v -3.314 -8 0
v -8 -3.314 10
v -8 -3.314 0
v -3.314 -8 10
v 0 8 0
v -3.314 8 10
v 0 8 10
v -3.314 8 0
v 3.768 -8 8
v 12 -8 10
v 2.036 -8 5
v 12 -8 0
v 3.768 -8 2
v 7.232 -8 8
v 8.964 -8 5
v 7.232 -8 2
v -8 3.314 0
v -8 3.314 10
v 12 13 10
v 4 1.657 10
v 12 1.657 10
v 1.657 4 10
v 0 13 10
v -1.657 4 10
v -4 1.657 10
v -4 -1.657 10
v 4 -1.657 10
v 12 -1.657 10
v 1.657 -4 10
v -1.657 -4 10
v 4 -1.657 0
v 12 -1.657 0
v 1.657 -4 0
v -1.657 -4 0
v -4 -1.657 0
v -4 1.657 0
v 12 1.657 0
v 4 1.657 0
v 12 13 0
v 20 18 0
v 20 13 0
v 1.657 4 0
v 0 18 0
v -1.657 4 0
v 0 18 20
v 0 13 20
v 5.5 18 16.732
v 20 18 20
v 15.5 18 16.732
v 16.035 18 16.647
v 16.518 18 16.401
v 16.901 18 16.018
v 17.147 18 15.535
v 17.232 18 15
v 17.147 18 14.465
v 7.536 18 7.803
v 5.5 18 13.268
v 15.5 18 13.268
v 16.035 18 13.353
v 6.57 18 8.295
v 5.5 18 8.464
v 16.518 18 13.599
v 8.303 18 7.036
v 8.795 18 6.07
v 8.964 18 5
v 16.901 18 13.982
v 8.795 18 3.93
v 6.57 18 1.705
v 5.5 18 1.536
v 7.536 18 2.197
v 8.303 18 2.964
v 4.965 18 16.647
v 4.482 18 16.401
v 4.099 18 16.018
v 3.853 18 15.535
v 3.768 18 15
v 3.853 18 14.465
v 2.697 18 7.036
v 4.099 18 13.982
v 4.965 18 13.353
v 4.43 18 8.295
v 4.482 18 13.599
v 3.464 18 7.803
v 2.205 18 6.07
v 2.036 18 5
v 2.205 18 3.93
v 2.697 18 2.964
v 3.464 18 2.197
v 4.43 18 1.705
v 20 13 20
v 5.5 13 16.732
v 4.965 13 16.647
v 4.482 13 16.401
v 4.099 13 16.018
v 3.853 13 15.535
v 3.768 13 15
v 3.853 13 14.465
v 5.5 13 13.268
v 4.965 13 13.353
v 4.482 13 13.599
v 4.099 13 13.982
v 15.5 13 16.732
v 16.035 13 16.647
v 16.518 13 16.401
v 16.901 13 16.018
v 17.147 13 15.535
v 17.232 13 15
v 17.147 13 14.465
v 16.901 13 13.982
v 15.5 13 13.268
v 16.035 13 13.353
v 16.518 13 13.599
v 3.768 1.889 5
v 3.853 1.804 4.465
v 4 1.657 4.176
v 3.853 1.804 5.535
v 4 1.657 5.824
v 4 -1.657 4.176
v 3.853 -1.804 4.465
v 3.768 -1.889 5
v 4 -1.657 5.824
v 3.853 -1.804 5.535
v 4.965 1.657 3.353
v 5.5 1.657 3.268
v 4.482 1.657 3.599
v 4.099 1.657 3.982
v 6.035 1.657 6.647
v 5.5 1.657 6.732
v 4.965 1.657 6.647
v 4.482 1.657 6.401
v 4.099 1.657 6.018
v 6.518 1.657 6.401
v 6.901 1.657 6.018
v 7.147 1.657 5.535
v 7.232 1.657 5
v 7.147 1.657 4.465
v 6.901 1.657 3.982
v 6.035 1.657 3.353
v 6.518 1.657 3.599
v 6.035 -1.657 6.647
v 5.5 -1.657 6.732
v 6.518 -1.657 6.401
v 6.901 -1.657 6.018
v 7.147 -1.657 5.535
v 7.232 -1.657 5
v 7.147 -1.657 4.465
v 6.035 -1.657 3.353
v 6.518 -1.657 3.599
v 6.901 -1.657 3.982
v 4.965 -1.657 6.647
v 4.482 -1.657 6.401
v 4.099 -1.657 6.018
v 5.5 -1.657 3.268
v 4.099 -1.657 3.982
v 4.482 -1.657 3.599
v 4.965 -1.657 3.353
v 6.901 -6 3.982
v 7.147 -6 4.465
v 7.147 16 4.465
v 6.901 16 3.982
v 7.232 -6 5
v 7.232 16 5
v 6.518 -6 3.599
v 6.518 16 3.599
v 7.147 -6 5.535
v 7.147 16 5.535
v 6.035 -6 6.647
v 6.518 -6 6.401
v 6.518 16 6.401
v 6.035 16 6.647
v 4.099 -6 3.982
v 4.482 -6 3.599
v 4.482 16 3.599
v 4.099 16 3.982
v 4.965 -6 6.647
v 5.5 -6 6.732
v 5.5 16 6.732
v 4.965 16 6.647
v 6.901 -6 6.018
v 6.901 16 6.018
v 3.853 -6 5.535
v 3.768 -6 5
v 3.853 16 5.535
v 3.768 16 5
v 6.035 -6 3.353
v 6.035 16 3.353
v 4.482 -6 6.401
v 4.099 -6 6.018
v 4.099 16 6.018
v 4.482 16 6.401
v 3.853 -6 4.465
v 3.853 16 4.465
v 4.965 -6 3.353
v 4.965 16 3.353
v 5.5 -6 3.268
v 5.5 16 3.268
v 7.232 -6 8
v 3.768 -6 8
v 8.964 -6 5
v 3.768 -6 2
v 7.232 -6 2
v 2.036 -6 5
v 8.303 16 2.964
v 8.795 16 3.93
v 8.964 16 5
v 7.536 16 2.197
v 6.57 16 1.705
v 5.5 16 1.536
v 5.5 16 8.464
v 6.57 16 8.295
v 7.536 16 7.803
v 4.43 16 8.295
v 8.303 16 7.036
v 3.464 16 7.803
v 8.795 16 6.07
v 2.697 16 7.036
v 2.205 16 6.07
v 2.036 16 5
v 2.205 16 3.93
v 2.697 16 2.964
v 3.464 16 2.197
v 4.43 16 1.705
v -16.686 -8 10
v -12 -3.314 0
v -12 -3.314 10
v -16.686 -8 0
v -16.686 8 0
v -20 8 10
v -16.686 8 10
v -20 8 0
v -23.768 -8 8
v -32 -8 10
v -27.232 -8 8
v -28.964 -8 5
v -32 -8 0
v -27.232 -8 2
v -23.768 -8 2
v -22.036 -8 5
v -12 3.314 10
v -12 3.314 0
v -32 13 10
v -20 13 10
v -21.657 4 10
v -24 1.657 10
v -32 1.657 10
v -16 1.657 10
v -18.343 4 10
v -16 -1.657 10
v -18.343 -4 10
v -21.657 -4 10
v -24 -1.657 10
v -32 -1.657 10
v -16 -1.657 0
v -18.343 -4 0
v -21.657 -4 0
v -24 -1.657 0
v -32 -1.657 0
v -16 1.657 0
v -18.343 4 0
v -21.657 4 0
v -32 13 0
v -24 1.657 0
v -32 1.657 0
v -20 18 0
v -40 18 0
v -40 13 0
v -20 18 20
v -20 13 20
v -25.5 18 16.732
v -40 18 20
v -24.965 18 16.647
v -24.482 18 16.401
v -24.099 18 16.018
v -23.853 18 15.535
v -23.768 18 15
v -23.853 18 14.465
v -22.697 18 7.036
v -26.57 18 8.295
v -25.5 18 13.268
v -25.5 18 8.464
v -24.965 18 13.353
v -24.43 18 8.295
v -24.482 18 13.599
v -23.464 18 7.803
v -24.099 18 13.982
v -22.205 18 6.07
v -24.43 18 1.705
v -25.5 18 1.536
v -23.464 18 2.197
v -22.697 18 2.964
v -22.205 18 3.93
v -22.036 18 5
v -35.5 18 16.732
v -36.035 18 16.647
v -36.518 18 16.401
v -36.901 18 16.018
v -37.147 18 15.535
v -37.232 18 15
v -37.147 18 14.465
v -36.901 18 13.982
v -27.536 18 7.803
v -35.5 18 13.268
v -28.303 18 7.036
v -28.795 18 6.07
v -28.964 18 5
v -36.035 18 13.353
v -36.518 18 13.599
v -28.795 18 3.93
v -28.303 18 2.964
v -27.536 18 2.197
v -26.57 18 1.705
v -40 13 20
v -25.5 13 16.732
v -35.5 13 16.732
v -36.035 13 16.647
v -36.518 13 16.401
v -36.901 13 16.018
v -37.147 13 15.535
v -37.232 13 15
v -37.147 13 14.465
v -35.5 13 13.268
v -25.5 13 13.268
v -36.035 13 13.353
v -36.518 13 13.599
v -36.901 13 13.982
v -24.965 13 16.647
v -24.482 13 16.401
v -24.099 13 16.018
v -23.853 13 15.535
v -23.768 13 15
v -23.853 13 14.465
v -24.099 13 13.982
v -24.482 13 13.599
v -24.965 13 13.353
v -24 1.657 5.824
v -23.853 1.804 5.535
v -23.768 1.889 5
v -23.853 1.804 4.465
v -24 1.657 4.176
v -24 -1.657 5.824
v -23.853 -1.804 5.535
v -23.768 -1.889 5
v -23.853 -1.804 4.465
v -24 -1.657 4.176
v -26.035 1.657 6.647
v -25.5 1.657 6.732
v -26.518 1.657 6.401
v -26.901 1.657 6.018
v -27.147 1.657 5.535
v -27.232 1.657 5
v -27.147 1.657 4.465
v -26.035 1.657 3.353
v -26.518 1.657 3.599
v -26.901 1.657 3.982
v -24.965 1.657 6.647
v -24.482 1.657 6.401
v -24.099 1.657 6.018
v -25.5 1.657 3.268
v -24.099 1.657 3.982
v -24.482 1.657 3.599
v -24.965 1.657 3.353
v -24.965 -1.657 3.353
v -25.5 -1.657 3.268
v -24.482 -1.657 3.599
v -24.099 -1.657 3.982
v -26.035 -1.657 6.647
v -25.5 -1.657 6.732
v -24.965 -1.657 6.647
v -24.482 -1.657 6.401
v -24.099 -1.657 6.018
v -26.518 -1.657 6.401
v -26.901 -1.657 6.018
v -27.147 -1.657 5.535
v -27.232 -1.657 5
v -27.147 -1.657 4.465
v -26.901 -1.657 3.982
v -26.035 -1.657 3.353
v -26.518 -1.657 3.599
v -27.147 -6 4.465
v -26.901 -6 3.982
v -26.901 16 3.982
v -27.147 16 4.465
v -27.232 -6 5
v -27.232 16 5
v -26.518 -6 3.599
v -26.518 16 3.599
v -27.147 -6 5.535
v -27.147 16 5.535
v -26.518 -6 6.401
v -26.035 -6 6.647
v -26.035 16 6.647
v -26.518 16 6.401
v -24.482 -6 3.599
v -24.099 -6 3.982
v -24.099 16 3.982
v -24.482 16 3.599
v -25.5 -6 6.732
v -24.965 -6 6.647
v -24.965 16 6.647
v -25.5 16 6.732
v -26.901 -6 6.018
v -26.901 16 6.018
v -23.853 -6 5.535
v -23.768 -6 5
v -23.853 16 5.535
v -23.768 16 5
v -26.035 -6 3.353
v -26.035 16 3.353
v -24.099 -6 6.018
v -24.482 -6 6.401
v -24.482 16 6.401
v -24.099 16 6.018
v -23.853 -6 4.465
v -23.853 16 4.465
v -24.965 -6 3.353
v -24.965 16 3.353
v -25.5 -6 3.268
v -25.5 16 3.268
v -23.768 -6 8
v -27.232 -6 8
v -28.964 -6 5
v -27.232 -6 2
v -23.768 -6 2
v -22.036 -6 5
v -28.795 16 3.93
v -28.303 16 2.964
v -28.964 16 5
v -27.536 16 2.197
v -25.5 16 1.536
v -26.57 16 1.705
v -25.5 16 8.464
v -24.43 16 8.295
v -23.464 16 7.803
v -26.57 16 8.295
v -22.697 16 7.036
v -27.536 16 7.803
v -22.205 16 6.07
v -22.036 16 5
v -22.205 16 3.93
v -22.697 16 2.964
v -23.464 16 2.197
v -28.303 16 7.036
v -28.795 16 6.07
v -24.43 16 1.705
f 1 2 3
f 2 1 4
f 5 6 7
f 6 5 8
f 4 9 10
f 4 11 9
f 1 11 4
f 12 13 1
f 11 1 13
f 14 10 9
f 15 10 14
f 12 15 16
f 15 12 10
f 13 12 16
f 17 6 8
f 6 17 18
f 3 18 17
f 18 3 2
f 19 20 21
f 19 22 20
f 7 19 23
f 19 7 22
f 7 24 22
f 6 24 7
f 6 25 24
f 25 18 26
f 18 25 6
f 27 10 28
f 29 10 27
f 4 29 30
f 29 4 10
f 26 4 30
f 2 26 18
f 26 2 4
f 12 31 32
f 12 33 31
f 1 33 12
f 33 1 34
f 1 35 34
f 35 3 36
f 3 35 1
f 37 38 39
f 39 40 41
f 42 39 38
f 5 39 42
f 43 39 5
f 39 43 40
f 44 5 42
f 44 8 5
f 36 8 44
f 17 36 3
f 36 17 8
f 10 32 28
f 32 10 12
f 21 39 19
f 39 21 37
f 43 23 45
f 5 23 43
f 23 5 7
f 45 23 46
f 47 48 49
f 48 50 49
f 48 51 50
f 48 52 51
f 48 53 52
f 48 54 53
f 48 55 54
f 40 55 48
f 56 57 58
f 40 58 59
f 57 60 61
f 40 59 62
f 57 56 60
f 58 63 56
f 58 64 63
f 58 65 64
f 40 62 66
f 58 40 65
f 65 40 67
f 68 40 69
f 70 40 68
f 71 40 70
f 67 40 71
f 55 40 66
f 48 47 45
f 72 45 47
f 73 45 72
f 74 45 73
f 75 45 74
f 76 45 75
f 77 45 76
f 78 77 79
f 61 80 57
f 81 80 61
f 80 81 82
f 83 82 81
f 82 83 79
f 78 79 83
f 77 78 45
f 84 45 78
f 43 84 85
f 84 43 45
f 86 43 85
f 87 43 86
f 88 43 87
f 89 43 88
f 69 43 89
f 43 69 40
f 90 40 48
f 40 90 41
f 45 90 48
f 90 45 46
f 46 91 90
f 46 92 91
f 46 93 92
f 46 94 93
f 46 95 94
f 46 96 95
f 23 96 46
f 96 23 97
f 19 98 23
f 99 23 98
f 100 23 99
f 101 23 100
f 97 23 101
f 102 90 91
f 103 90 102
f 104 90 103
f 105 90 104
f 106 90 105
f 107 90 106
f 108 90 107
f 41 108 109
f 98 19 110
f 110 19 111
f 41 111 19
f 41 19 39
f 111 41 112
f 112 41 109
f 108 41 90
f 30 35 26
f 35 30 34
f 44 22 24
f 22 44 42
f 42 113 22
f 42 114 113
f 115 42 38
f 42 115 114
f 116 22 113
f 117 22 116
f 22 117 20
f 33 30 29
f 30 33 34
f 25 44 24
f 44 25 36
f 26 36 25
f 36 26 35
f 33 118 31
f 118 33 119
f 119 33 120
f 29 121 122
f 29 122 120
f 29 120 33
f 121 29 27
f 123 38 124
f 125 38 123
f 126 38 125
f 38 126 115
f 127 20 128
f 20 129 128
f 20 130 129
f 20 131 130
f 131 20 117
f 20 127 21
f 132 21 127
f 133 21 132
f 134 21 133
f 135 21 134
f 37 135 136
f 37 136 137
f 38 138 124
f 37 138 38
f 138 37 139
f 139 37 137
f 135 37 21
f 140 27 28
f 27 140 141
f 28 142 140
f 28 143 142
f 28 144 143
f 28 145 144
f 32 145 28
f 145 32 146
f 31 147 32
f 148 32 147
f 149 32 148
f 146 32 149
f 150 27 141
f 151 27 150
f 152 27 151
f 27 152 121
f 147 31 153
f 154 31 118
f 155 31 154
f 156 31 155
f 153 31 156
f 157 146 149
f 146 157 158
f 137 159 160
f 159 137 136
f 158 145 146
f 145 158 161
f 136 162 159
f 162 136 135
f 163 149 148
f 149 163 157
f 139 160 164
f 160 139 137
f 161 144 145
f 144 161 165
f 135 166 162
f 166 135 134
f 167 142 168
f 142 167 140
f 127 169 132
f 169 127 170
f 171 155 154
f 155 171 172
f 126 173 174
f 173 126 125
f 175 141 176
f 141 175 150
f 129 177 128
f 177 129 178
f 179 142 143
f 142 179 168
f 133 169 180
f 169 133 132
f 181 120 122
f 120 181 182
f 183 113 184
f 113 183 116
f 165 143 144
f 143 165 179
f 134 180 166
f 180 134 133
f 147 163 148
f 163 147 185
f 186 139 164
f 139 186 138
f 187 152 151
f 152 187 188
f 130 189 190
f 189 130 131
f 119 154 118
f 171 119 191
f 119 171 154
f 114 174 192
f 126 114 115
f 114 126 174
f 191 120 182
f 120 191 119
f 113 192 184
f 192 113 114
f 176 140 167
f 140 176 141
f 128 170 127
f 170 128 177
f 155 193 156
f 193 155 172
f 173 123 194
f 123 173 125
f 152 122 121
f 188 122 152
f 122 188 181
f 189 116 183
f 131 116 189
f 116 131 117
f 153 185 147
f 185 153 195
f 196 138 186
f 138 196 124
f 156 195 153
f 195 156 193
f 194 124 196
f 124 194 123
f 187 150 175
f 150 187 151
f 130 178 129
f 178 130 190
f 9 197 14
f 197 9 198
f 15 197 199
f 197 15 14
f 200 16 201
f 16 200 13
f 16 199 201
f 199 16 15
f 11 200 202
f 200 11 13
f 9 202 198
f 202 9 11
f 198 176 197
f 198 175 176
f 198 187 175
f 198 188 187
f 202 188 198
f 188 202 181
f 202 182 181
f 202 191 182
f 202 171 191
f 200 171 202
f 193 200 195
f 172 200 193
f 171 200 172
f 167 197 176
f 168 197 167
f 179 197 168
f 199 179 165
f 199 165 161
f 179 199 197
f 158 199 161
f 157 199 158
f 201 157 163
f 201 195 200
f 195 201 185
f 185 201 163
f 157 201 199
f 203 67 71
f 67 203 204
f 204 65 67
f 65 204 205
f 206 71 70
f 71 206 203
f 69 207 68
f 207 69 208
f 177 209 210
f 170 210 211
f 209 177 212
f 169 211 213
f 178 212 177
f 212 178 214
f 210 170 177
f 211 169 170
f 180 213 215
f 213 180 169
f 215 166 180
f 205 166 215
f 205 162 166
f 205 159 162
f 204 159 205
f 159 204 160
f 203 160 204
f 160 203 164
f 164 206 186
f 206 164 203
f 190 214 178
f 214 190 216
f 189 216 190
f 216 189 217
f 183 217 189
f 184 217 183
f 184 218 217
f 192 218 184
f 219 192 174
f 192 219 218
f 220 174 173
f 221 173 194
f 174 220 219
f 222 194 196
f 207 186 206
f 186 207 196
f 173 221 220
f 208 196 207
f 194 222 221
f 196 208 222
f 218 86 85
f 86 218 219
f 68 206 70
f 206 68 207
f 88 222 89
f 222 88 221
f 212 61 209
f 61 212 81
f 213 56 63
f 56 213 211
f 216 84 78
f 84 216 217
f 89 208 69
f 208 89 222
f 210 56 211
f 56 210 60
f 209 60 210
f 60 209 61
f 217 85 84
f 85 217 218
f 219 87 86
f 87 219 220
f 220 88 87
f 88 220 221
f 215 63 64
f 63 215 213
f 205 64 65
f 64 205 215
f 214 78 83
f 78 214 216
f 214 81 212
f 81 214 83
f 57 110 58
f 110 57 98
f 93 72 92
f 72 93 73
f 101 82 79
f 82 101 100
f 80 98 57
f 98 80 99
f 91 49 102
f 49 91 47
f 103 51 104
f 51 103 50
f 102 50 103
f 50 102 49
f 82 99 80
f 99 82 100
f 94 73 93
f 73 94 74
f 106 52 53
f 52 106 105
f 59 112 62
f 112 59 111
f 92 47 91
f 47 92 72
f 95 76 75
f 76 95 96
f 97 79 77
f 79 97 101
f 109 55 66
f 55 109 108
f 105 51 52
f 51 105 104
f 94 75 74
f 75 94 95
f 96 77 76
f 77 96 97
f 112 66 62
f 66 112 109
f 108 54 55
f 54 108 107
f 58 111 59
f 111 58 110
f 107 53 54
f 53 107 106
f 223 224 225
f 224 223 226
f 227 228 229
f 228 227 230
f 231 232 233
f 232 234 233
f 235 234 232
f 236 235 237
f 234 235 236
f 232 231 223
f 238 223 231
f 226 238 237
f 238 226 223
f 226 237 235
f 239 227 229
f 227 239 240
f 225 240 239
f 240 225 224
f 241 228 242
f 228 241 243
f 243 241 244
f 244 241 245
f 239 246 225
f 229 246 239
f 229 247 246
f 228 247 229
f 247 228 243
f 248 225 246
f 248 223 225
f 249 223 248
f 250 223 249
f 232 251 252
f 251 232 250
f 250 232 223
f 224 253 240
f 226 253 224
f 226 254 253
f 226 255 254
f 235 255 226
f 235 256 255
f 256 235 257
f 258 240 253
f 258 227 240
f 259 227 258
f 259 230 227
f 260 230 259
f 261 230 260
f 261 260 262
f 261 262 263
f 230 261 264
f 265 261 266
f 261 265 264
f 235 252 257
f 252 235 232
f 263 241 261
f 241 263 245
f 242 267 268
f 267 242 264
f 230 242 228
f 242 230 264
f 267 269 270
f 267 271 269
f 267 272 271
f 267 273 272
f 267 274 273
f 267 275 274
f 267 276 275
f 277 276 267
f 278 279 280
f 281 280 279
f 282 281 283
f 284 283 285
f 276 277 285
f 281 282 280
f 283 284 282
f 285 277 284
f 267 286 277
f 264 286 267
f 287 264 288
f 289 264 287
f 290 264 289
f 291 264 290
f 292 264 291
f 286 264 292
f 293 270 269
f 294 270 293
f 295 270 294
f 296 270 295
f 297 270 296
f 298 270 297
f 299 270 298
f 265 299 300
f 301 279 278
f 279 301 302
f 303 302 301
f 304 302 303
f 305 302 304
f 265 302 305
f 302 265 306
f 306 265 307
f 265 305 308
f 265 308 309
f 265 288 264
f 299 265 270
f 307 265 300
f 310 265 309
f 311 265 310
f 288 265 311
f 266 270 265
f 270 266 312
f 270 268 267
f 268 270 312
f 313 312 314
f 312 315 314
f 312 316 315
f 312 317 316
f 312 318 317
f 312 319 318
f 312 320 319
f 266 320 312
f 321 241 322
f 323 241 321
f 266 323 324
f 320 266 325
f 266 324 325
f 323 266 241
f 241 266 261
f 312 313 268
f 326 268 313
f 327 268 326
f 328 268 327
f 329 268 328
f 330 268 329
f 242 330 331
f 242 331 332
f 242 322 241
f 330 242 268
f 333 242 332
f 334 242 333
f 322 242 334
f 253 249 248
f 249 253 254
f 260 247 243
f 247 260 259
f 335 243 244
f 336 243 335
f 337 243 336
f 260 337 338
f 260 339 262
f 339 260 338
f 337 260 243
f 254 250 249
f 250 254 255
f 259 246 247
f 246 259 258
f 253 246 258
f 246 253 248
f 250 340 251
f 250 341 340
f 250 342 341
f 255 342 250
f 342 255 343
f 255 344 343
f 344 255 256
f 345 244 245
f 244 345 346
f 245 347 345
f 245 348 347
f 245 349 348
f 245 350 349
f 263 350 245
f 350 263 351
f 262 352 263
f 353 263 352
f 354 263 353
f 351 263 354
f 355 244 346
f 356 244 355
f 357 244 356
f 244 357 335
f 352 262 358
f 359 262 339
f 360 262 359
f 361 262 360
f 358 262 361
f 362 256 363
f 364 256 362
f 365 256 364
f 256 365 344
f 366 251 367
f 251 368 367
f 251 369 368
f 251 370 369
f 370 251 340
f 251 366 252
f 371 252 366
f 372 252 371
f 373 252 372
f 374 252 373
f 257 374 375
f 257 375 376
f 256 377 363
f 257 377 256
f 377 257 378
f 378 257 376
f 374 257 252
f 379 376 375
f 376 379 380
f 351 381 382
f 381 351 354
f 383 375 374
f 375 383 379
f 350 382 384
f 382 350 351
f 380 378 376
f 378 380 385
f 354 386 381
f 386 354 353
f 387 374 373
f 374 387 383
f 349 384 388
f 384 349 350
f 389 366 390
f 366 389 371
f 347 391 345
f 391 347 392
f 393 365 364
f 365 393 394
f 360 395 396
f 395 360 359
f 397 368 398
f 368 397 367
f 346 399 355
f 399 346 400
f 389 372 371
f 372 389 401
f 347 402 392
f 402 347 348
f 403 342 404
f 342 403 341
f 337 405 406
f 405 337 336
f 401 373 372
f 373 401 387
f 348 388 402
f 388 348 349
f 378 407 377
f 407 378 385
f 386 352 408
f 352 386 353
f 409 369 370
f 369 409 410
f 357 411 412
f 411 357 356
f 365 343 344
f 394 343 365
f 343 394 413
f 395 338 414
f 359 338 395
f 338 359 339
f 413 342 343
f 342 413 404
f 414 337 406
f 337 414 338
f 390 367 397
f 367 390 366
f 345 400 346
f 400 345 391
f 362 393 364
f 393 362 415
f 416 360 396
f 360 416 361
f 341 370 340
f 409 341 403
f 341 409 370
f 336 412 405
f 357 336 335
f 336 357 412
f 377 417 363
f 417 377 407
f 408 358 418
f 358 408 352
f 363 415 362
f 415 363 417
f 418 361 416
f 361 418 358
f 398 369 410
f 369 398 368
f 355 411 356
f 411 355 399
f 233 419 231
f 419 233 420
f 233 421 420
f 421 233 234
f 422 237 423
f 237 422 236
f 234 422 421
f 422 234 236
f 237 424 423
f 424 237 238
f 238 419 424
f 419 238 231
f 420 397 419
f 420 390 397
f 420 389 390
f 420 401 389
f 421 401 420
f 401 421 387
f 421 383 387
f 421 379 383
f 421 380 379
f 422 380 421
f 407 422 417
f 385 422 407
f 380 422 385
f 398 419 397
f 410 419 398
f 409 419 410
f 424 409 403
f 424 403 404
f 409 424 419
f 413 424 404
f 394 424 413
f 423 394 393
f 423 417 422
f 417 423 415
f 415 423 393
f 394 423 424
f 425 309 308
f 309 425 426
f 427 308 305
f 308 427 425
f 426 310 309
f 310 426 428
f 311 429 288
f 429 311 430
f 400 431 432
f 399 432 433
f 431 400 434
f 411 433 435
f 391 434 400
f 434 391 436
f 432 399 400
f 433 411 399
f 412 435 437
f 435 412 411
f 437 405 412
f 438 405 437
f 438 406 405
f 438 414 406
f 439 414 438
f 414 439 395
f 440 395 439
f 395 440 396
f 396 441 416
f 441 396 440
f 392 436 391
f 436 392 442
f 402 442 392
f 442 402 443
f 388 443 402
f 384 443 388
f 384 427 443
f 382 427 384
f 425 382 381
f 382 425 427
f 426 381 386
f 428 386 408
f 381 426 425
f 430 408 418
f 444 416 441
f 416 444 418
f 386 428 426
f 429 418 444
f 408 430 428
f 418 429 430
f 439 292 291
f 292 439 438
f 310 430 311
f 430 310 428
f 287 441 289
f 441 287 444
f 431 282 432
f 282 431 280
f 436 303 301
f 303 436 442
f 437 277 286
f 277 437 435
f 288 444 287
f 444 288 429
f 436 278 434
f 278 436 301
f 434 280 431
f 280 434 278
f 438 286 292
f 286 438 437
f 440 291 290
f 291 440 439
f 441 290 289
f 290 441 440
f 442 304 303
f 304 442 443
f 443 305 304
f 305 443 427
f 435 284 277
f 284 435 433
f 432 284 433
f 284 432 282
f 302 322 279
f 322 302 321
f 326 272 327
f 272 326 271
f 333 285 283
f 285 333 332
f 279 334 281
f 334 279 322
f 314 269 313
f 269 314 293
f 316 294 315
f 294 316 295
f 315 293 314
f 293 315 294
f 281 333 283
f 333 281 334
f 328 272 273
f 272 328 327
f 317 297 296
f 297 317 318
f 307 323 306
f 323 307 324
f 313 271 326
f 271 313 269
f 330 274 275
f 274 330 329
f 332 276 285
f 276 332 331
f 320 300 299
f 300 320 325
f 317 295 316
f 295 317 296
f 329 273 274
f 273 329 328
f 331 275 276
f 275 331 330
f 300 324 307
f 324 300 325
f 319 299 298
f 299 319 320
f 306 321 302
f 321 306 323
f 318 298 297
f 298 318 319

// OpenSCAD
include <wallace2.scad>;
bed_mount2();
translate([-20,0,0]) mirror([1,0,0])bed_mount2();


module bed_mount2() difference() {
	union(){
//	linear_extrude(height = 10, convexity = 5) 
		difference() {
		union() {
			rotate(180 / 8) cylinder(r=(rod_size + 8) * da8,h=10, $fn = 8);
			translate([0, -rod_size / 2 - 4, 0]) cube([rod_size / 2 + 8, max(rod_size + 8, rod_size / 2 + 4 + bed_mount_height),10]);
		
		translate([0, bed_mount_height-5, 0])	cube([20,5,10+10]);
		
		}
		rotate(180 / 8) cylinder(r=rod_size * da8,h=10, $fn = 8);
		translate([0, -rod_size / (1 + sqrt(2)) / 2, 0]) cube([rod_size + 10, rod_size / (1 + sqrt(2)),10]);
	}
 }   
	translate([rod_size / 2 + 1.5, -rod_size / 2 - 6, 5]) rotate([-90, 0, 0]) {
		cylinder(r = m3_size * da6, h = max(rod_size + 12, rod_size / 2 + 7 + bed_mount_height, $fn = 6));
		cylinder(r = m3_nut_size * da6, h = 4, $fn = 6);
		translate([0,0,-rod_size / 2 + 8+bed_mount_height+4])#cylinder(r = m3_nut_size * da6, h = 4, $fn = 20);
		translate([0,0,-6])hull(){
		translate([0,-10,-rod_size / 2 + 8+bed_mount_height+5])#cylinder(r = m3_size * da6, h = 5+4, $fn = 20);
		translate([10,-10,-rod_size / 2 + 8+bed_mount_height+5])#cylinder(r = m3_size * da6, h = 5+4, $fn = 20);
		}

	}
}
